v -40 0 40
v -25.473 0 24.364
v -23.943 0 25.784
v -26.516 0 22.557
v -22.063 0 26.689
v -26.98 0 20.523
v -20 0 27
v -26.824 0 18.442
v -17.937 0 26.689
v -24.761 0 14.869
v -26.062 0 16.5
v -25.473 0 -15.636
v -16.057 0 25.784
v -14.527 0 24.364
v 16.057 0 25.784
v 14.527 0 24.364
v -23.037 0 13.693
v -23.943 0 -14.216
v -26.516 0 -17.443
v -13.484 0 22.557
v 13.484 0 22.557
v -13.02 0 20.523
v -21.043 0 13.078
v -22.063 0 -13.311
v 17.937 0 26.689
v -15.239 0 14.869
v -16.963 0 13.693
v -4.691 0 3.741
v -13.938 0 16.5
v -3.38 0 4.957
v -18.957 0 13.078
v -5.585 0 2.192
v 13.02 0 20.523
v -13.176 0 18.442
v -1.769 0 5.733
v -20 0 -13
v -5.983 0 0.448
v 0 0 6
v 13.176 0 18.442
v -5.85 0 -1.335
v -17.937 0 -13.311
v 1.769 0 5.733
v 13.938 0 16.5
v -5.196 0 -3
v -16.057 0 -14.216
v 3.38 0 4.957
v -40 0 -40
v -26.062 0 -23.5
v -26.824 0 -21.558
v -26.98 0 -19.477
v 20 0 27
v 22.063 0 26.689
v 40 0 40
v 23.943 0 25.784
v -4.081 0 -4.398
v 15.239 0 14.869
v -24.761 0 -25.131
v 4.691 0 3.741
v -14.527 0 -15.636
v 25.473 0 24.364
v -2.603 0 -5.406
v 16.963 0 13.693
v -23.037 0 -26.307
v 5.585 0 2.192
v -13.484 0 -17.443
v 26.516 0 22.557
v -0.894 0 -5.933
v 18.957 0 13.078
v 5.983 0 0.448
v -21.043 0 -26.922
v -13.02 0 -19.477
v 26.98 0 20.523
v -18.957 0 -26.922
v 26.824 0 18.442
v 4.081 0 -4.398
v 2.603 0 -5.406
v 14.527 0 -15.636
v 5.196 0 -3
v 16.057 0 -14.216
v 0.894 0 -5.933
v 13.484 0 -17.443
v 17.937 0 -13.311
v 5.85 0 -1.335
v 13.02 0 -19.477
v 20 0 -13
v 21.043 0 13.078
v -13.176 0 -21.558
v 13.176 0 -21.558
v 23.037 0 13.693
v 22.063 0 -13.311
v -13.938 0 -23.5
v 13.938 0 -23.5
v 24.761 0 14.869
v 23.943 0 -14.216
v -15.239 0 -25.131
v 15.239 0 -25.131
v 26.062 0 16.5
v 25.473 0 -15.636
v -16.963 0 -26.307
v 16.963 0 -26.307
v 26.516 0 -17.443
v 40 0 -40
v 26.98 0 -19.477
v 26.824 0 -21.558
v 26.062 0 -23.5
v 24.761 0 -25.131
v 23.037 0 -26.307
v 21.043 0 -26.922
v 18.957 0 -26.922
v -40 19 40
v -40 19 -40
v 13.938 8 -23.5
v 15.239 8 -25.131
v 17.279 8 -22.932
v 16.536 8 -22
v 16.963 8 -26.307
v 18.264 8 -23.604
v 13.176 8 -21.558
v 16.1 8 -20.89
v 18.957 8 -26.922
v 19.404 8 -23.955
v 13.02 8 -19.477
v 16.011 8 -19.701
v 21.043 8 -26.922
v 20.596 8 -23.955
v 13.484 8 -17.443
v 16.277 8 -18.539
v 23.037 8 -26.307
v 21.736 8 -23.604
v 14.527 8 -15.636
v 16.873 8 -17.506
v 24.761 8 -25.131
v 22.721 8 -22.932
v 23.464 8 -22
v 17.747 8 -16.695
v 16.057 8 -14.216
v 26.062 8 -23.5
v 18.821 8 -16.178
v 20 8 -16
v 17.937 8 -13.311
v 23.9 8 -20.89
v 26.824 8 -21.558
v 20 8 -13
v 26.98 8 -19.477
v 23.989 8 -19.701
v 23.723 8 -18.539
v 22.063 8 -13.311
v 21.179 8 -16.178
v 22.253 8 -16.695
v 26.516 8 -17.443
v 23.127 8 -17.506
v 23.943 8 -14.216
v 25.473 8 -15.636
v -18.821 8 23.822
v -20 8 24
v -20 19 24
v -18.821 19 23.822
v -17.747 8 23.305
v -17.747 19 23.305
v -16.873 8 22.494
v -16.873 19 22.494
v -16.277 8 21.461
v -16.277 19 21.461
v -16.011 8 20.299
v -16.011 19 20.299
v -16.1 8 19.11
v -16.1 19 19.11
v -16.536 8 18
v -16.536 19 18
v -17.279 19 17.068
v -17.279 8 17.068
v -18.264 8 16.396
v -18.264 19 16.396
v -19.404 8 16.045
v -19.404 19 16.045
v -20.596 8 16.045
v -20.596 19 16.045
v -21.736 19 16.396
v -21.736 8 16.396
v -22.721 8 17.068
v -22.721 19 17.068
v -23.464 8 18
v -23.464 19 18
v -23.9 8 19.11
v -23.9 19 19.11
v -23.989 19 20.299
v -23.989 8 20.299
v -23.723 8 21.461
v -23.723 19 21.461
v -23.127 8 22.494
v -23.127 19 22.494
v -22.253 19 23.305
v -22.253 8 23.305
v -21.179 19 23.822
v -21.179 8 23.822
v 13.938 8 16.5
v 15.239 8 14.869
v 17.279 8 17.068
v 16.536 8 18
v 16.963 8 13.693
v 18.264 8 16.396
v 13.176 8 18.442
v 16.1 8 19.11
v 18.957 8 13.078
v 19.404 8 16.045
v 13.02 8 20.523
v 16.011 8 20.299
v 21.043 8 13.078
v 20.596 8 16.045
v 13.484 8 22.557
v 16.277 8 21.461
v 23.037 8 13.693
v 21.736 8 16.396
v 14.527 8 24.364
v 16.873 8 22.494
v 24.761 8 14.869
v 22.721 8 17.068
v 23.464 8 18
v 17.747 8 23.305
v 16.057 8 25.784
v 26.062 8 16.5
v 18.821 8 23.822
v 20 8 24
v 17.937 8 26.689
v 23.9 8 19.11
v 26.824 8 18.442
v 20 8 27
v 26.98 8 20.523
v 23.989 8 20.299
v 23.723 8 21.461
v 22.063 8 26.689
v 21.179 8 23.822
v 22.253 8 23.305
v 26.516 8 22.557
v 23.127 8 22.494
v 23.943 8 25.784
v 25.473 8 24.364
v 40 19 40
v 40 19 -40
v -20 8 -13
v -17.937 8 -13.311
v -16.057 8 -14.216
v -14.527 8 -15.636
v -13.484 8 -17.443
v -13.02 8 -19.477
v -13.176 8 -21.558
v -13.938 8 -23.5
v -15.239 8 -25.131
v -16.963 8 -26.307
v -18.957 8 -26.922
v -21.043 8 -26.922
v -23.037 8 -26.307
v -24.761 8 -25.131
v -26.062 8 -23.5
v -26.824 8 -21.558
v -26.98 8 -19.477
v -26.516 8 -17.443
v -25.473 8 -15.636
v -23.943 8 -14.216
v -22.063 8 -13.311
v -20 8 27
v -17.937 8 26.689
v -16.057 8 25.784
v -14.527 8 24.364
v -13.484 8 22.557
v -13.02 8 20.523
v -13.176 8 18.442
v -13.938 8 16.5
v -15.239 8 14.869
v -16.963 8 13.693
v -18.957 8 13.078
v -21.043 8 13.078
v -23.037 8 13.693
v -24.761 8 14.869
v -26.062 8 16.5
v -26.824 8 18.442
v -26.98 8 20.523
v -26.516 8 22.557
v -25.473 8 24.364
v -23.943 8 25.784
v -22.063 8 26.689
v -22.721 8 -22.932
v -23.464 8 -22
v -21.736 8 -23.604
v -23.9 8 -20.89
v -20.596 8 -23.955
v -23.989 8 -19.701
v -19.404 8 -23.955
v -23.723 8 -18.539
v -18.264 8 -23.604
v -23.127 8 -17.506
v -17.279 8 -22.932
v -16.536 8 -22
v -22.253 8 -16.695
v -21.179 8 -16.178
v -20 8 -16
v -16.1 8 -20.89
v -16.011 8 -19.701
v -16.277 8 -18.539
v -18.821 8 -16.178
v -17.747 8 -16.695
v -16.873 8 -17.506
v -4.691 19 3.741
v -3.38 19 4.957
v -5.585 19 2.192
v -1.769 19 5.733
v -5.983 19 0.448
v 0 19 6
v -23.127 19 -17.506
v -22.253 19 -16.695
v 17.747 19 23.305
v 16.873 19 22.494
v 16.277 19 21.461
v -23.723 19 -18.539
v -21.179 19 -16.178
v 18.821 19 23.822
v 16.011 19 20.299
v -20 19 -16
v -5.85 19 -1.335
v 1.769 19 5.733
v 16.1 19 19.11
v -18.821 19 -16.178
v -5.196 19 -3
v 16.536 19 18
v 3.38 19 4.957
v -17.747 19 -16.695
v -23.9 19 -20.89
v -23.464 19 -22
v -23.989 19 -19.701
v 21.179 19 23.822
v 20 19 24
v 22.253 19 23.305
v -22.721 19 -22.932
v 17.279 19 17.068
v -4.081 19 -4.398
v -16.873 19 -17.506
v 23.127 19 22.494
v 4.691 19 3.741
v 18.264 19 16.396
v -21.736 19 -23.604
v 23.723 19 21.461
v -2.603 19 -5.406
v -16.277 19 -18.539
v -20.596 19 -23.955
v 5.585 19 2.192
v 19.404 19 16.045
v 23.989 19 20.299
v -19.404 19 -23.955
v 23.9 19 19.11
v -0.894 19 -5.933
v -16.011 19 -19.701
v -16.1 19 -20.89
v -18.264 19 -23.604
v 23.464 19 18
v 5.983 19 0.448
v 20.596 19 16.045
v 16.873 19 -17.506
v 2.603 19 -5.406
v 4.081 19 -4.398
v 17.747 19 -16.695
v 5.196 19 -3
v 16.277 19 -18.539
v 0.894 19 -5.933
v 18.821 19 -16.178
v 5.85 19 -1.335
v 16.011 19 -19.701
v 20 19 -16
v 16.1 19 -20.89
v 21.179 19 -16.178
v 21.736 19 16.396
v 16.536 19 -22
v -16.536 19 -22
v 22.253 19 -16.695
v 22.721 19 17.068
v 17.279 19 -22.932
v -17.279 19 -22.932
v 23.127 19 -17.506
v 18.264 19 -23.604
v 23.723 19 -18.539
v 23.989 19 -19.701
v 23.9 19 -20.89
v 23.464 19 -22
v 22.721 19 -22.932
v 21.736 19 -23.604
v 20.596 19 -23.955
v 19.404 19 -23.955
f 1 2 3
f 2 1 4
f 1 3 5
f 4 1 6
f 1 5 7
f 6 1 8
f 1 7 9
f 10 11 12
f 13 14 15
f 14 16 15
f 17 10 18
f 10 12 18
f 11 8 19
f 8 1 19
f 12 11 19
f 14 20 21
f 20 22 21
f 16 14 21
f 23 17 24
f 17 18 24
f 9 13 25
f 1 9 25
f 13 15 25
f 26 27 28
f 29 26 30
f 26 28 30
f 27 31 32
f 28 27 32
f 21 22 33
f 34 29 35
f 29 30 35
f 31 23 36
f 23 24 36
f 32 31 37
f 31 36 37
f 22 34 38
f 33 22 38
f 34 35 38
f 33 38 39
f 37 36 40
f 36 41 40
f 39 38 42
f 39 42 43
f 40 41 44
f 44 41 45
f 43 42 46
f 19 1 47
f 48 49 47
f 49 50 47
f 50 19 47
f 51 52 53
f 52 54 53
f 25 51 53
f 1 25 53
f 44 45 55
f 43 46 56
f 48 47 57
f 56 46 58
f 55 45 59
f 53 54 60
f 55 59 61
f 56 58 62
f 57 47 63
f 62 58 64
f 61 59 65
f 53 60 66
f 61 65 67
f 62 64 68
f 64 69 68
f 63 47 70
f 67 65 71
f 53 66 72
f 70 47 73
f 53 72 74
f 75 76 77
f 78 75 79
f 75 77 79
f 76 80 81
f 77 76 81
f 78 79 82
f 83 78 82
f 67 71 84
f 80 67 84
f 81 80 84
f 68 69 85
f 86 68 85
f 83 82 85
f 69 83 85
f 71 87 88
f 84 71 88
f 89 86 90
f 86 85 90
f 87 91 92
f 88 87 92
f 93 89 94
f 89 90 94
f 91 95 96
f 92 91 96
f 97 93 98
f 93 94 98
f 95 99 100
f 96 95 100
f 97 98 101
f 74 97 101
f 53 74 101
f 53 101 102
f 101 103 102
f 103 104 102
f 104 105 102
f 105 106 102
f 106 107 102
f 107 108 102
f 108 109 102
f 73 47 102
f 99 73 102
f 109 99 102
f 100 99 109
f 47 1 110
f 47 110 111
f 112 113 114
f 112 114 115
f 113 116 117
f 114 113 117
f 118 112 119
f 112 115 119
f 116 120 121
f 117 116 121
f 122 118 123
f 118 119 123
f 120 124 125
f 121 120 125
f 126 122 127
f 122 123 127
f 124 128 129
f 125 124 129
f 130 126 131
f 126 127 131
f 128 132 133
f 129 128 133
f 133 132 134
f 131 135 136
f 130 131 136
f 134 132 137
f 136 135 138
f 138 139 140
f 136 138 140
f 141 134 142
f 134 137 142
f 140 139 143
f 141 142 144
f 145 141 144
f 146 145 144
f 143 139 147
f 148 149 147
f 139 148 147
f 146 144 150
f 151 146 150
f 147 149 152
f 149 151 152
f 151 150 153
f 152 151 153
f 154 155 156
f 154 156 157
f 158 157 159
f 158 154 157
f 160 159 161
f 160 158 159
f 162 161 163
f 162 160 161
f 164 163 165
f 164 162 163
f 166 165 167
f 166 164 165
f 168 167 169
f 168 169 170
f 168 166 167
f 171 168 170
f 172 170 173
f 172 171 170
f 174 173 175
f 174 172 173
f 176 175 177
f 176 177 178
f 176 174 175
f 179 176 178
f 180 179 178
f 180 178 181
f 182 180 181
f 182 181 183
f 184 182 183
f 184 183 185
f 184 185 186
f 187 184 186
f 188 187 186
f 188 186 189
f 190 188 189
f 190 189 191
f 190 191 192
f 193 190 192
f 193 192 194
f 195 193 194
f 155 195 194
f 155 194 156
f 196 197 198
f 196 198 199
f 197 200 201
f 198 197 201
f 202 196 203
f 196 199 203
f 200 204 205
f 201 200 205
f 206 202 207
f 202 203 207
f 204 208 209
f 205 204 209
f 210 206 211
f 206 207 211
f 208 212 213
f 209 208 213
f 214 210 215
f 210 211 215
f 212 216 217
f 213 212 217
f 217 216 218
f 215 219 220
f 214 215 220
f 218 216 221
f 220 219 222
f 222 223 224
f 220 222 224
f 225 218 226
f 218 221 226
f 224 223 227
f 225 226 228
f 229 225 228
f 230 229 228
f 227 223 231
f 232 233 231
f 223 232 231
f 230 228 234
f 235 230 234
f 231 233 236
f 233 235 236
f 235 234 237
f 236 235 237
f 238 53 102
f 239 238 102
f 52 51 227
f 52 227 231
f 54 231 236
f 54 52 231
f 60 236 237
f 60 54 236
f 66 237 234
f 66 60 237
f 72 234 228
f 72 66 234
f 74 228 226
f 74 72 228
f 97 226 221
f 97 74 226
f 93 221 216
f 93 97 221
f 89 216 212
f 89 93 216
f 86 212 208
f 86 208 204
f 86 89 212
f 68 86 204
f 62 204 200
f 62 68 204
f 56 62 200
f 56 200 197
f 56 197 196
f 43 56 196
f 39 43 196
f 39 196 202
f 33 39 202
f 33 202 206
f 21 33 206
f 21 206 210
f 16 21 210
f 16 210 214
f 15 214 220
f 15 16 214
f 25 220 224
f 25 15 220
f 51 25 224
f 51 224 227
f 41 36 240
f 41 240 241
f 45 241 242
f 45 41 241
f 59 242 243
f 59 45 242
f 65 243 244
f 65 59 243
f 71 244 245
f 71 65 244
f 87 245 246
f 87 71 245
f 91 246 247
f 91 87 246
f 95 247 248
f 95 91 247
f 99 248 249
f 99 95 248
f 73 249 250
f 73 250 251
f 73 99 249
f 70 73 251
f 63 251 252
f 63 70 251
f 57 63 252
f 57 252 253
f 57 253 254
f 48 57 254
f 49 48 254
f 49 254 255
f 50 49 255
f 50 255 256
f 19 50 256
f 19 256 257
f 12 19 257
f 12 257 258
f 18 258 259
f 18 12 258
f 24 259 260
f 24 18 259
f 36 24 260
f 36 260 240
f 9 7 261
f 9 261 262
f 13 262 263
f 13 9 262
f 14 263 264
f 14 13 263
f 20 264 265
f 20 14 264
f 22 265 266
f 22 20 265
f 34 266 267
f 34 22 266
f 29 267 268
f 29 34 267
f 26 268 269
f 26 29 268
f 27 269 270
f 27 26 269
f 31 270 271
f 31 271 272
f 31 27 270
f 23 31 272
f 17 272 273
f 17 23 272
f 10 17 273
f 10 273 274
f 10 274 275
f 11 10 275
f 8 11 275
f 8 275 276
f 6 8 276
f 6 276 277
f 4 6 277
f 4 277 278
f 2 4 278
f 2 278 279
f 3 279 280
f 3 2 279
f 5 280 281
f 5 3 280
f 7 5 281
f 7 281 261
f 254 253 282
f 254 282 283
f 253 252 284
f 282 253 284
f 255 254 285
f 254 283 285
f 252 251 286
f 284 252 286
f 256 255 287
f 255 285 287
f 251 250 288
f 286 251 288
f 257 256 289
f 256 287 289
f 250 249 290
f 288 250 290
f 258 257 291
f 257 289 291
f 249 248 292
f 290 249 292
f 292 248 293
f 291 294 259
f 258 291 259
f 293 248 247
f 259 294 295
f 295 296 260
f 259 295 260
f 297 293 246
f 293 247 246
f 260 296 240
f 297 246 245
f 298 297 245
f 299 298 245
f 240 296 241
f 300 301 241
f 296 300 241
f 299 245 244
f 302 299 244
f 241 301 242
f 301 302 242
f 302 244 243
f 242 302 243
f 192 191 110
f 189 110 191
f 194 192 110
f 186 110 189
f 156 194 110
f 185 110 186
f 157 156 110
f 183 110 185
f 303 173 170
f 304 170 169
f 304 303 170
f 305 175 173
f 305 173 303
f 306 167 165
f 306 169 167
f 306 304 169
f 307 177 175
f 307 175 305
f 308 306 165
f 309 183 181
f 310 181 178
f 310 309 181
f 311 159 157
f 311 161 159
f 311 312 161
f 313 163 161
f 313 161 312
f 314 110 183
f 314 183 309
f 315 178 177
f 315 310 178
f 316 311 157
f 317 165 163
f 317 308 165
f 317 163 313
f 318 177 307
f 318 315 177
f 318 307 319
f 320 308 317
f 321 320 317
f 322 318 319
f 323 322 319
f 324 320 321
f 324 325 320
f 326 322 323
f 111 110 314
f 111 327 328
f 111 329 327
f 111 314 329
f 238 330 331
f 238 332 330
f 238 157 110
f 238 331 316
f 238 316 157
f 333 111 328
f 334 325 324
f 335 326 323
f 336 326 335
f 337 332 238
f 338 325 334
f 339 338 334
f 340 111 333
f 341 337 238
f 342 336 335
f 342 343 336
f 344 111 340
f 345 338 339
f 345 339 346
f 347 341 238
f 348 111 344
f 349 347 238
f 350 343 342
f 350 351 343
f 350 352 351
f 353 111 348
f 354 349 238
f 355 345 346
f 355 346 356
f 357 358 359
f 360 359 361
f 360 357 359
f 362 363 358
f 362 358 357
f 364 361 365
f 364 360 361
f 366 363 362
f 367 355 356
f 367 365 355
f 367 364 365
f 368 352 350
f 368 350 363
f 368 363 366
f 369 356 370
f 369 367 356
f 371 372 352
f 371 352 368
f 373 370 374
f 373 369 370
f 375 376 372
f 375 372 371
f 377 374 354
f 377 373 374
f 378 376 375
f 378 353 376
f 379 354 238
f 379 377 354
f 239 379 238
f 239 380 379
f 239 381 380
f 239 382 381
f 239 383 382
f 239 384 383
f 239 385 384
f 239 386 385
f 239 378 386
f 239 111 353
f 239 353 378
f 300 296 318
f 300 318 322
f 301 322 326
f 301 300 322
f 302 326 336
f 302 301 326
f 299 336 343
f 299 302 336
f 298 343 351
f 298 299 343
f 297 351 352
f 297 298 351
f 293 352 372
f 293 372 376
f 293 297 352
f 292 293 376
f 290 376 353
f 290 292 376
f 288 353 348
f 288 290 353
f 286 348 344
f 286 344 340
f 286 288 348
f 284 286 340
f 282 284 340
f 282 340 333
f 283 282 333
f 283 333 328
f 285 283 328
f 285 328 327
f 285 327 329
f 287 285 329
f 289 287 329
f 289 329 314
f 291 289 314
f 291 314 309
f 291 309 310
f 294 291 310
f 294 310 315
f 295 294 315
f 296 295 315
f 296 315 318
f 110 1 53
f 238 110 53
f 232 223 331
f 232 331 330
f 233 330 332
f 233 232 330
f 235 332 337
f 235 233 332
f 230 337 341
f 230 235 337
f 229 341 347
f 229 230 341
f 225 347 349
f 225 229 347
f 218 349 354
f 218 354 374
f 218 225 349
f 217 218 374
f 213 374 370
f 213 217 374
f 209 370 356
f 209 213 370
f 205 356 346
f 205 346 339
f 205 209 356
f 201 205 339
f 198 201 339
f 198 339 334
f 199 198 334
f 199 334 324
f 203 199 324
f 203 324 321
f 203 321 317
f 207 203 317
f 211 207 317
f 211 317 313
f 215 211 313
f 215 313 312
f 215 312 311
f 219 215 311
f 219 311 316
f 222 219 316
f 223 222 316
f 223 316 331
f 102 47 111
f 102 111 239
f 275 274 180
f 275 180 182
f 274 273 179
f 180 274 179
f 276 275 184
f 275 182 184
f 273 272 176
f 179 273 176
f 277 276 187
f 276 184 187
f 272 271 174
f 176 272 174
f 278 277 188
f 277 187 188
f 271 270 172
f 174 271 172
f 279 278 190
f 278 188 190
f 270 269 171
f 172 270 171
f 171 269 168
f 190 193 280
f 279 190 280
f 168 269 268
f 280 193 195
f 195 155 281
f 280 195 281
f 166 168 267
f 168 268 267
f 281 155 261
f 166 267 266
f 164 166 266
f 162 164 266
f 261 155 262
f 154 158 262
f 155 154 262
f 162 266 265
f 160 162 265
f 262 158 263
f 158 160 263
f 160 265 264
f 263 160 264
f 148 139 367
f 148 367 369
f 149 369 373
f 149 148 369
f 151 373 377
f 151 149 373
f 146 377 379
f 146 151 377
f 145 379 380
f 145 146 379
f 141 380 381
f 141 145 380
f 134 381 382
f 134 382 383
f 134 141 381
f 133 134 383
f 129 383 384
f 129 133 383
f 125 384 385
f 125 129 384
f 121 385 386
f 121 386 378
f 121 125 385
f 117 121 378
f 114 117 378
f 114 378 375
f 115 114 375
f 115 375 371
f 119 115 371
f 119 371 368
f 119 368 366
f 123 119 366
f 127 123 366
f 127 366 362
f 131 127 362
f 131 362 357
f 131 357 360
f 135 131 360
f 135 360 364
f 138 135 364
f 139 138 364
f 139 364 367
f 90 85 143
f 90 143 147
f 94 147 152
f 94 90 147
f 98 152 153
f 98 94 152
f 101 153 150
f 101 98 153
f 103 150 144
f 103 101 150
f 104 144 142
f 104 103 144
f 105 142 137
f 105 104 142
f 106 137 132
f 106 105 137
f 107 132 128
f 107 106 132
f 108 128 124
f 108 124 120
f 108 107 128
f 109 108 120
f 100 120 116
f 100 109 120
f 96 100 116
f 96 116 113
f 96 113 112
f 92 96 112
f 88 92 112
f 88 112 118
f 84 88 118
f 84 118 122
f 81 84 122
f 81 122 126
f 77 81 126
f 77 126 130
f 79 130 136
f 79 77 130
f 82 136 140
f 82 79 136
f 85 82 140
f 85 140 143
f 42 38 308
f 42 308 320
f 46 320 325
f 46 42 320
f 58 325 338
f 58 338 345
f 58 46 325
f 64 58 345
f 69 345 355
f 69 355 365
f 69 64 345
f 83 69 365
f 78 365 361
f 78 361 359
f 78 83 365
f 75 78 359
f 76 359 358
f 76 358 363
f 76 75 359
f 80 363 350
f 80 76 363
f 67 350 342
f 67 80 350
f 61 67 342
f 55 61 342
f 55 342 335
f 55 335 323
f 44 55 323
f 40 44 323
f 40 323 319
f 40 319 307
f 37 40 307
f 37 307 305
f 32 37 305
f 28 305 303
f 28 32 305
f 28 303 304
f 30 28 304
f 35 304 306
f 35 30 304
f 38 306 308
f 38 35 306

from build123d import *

# Parameters (mm, degrees)
SKETCH1_W           = 80
SKETCH1_H           = 80
SKETCH1_R           = 4
SKETCH1_R_2         = 6
BOSS_EXTRUDE1_DEPTH = 19
SKETCH2_R           = 7
CUT_EXTRUDE1_DEPTH  = 8


with BuildPart() as part:
    # Sketch1 → Boss-Extrude1 (new body)
    with BuildSketch(Plane(origin=(0, 0, 0), x_dir=(1, 0, 0), z_dir=(0, 1, 0))):
        Rectangle(SKETCH1_W, SKETCH1_H)
        with Locations(Location((-20, 20, 0), (0, 0, 270))):
            Circle(SKETCH1_R, mode=Mode.SUBTRACT)
        with Locations(Location((20, 20, 0), (0, 0, 270))):
            Circle(SKETCH1_R, mode=Mode.SUBTRACT)
        with Locations(Location((20, -20, 0), (0, 0, 270))):
            Circle(SKETCH1_R, mode=Mode.SUBTRACT)
        with Locations(Location((-20, -20, 0), (0, 0, 270))):
            Circle(SKETCH1_R, mode=Mode.SUBTRACT)
        with Locations(Location((0, 0, 0), (0, 0, 270))):
            Circle(SKETCH1_R_2, mode=Mode.SUBTRACT)
    extrude(amount=BOSS_EXTRUDE1_DEPTH)

    # Sketch2 → Cut-Extrude1 (cut)
    with BuildSketch(Plane(origin=(0, 0, 0), x_dir=(1, 0, 0), z_dir=(0, 1, 0))):
        with Locations(Location((-20, 20, 0), (0, 0, 270))):
            Circle(SKETCH2_R)
        with Locations(Location((20, 20, 0), (0, 0, 270))):
            Circle(SKETCH2_R)
        with Locations(Location((20, -20, 0), (0, 0, 270))):
            Circle(SKETCH2_R)
        with Locations(Location((-20, -20, 0), (0, 0, 270))):
            Circle(SKETCH2_R)
    extrude(amount=CUT_EXTRUDE1_DEPTH, mode=Mode.SUBTRACT)


solid = part.part
